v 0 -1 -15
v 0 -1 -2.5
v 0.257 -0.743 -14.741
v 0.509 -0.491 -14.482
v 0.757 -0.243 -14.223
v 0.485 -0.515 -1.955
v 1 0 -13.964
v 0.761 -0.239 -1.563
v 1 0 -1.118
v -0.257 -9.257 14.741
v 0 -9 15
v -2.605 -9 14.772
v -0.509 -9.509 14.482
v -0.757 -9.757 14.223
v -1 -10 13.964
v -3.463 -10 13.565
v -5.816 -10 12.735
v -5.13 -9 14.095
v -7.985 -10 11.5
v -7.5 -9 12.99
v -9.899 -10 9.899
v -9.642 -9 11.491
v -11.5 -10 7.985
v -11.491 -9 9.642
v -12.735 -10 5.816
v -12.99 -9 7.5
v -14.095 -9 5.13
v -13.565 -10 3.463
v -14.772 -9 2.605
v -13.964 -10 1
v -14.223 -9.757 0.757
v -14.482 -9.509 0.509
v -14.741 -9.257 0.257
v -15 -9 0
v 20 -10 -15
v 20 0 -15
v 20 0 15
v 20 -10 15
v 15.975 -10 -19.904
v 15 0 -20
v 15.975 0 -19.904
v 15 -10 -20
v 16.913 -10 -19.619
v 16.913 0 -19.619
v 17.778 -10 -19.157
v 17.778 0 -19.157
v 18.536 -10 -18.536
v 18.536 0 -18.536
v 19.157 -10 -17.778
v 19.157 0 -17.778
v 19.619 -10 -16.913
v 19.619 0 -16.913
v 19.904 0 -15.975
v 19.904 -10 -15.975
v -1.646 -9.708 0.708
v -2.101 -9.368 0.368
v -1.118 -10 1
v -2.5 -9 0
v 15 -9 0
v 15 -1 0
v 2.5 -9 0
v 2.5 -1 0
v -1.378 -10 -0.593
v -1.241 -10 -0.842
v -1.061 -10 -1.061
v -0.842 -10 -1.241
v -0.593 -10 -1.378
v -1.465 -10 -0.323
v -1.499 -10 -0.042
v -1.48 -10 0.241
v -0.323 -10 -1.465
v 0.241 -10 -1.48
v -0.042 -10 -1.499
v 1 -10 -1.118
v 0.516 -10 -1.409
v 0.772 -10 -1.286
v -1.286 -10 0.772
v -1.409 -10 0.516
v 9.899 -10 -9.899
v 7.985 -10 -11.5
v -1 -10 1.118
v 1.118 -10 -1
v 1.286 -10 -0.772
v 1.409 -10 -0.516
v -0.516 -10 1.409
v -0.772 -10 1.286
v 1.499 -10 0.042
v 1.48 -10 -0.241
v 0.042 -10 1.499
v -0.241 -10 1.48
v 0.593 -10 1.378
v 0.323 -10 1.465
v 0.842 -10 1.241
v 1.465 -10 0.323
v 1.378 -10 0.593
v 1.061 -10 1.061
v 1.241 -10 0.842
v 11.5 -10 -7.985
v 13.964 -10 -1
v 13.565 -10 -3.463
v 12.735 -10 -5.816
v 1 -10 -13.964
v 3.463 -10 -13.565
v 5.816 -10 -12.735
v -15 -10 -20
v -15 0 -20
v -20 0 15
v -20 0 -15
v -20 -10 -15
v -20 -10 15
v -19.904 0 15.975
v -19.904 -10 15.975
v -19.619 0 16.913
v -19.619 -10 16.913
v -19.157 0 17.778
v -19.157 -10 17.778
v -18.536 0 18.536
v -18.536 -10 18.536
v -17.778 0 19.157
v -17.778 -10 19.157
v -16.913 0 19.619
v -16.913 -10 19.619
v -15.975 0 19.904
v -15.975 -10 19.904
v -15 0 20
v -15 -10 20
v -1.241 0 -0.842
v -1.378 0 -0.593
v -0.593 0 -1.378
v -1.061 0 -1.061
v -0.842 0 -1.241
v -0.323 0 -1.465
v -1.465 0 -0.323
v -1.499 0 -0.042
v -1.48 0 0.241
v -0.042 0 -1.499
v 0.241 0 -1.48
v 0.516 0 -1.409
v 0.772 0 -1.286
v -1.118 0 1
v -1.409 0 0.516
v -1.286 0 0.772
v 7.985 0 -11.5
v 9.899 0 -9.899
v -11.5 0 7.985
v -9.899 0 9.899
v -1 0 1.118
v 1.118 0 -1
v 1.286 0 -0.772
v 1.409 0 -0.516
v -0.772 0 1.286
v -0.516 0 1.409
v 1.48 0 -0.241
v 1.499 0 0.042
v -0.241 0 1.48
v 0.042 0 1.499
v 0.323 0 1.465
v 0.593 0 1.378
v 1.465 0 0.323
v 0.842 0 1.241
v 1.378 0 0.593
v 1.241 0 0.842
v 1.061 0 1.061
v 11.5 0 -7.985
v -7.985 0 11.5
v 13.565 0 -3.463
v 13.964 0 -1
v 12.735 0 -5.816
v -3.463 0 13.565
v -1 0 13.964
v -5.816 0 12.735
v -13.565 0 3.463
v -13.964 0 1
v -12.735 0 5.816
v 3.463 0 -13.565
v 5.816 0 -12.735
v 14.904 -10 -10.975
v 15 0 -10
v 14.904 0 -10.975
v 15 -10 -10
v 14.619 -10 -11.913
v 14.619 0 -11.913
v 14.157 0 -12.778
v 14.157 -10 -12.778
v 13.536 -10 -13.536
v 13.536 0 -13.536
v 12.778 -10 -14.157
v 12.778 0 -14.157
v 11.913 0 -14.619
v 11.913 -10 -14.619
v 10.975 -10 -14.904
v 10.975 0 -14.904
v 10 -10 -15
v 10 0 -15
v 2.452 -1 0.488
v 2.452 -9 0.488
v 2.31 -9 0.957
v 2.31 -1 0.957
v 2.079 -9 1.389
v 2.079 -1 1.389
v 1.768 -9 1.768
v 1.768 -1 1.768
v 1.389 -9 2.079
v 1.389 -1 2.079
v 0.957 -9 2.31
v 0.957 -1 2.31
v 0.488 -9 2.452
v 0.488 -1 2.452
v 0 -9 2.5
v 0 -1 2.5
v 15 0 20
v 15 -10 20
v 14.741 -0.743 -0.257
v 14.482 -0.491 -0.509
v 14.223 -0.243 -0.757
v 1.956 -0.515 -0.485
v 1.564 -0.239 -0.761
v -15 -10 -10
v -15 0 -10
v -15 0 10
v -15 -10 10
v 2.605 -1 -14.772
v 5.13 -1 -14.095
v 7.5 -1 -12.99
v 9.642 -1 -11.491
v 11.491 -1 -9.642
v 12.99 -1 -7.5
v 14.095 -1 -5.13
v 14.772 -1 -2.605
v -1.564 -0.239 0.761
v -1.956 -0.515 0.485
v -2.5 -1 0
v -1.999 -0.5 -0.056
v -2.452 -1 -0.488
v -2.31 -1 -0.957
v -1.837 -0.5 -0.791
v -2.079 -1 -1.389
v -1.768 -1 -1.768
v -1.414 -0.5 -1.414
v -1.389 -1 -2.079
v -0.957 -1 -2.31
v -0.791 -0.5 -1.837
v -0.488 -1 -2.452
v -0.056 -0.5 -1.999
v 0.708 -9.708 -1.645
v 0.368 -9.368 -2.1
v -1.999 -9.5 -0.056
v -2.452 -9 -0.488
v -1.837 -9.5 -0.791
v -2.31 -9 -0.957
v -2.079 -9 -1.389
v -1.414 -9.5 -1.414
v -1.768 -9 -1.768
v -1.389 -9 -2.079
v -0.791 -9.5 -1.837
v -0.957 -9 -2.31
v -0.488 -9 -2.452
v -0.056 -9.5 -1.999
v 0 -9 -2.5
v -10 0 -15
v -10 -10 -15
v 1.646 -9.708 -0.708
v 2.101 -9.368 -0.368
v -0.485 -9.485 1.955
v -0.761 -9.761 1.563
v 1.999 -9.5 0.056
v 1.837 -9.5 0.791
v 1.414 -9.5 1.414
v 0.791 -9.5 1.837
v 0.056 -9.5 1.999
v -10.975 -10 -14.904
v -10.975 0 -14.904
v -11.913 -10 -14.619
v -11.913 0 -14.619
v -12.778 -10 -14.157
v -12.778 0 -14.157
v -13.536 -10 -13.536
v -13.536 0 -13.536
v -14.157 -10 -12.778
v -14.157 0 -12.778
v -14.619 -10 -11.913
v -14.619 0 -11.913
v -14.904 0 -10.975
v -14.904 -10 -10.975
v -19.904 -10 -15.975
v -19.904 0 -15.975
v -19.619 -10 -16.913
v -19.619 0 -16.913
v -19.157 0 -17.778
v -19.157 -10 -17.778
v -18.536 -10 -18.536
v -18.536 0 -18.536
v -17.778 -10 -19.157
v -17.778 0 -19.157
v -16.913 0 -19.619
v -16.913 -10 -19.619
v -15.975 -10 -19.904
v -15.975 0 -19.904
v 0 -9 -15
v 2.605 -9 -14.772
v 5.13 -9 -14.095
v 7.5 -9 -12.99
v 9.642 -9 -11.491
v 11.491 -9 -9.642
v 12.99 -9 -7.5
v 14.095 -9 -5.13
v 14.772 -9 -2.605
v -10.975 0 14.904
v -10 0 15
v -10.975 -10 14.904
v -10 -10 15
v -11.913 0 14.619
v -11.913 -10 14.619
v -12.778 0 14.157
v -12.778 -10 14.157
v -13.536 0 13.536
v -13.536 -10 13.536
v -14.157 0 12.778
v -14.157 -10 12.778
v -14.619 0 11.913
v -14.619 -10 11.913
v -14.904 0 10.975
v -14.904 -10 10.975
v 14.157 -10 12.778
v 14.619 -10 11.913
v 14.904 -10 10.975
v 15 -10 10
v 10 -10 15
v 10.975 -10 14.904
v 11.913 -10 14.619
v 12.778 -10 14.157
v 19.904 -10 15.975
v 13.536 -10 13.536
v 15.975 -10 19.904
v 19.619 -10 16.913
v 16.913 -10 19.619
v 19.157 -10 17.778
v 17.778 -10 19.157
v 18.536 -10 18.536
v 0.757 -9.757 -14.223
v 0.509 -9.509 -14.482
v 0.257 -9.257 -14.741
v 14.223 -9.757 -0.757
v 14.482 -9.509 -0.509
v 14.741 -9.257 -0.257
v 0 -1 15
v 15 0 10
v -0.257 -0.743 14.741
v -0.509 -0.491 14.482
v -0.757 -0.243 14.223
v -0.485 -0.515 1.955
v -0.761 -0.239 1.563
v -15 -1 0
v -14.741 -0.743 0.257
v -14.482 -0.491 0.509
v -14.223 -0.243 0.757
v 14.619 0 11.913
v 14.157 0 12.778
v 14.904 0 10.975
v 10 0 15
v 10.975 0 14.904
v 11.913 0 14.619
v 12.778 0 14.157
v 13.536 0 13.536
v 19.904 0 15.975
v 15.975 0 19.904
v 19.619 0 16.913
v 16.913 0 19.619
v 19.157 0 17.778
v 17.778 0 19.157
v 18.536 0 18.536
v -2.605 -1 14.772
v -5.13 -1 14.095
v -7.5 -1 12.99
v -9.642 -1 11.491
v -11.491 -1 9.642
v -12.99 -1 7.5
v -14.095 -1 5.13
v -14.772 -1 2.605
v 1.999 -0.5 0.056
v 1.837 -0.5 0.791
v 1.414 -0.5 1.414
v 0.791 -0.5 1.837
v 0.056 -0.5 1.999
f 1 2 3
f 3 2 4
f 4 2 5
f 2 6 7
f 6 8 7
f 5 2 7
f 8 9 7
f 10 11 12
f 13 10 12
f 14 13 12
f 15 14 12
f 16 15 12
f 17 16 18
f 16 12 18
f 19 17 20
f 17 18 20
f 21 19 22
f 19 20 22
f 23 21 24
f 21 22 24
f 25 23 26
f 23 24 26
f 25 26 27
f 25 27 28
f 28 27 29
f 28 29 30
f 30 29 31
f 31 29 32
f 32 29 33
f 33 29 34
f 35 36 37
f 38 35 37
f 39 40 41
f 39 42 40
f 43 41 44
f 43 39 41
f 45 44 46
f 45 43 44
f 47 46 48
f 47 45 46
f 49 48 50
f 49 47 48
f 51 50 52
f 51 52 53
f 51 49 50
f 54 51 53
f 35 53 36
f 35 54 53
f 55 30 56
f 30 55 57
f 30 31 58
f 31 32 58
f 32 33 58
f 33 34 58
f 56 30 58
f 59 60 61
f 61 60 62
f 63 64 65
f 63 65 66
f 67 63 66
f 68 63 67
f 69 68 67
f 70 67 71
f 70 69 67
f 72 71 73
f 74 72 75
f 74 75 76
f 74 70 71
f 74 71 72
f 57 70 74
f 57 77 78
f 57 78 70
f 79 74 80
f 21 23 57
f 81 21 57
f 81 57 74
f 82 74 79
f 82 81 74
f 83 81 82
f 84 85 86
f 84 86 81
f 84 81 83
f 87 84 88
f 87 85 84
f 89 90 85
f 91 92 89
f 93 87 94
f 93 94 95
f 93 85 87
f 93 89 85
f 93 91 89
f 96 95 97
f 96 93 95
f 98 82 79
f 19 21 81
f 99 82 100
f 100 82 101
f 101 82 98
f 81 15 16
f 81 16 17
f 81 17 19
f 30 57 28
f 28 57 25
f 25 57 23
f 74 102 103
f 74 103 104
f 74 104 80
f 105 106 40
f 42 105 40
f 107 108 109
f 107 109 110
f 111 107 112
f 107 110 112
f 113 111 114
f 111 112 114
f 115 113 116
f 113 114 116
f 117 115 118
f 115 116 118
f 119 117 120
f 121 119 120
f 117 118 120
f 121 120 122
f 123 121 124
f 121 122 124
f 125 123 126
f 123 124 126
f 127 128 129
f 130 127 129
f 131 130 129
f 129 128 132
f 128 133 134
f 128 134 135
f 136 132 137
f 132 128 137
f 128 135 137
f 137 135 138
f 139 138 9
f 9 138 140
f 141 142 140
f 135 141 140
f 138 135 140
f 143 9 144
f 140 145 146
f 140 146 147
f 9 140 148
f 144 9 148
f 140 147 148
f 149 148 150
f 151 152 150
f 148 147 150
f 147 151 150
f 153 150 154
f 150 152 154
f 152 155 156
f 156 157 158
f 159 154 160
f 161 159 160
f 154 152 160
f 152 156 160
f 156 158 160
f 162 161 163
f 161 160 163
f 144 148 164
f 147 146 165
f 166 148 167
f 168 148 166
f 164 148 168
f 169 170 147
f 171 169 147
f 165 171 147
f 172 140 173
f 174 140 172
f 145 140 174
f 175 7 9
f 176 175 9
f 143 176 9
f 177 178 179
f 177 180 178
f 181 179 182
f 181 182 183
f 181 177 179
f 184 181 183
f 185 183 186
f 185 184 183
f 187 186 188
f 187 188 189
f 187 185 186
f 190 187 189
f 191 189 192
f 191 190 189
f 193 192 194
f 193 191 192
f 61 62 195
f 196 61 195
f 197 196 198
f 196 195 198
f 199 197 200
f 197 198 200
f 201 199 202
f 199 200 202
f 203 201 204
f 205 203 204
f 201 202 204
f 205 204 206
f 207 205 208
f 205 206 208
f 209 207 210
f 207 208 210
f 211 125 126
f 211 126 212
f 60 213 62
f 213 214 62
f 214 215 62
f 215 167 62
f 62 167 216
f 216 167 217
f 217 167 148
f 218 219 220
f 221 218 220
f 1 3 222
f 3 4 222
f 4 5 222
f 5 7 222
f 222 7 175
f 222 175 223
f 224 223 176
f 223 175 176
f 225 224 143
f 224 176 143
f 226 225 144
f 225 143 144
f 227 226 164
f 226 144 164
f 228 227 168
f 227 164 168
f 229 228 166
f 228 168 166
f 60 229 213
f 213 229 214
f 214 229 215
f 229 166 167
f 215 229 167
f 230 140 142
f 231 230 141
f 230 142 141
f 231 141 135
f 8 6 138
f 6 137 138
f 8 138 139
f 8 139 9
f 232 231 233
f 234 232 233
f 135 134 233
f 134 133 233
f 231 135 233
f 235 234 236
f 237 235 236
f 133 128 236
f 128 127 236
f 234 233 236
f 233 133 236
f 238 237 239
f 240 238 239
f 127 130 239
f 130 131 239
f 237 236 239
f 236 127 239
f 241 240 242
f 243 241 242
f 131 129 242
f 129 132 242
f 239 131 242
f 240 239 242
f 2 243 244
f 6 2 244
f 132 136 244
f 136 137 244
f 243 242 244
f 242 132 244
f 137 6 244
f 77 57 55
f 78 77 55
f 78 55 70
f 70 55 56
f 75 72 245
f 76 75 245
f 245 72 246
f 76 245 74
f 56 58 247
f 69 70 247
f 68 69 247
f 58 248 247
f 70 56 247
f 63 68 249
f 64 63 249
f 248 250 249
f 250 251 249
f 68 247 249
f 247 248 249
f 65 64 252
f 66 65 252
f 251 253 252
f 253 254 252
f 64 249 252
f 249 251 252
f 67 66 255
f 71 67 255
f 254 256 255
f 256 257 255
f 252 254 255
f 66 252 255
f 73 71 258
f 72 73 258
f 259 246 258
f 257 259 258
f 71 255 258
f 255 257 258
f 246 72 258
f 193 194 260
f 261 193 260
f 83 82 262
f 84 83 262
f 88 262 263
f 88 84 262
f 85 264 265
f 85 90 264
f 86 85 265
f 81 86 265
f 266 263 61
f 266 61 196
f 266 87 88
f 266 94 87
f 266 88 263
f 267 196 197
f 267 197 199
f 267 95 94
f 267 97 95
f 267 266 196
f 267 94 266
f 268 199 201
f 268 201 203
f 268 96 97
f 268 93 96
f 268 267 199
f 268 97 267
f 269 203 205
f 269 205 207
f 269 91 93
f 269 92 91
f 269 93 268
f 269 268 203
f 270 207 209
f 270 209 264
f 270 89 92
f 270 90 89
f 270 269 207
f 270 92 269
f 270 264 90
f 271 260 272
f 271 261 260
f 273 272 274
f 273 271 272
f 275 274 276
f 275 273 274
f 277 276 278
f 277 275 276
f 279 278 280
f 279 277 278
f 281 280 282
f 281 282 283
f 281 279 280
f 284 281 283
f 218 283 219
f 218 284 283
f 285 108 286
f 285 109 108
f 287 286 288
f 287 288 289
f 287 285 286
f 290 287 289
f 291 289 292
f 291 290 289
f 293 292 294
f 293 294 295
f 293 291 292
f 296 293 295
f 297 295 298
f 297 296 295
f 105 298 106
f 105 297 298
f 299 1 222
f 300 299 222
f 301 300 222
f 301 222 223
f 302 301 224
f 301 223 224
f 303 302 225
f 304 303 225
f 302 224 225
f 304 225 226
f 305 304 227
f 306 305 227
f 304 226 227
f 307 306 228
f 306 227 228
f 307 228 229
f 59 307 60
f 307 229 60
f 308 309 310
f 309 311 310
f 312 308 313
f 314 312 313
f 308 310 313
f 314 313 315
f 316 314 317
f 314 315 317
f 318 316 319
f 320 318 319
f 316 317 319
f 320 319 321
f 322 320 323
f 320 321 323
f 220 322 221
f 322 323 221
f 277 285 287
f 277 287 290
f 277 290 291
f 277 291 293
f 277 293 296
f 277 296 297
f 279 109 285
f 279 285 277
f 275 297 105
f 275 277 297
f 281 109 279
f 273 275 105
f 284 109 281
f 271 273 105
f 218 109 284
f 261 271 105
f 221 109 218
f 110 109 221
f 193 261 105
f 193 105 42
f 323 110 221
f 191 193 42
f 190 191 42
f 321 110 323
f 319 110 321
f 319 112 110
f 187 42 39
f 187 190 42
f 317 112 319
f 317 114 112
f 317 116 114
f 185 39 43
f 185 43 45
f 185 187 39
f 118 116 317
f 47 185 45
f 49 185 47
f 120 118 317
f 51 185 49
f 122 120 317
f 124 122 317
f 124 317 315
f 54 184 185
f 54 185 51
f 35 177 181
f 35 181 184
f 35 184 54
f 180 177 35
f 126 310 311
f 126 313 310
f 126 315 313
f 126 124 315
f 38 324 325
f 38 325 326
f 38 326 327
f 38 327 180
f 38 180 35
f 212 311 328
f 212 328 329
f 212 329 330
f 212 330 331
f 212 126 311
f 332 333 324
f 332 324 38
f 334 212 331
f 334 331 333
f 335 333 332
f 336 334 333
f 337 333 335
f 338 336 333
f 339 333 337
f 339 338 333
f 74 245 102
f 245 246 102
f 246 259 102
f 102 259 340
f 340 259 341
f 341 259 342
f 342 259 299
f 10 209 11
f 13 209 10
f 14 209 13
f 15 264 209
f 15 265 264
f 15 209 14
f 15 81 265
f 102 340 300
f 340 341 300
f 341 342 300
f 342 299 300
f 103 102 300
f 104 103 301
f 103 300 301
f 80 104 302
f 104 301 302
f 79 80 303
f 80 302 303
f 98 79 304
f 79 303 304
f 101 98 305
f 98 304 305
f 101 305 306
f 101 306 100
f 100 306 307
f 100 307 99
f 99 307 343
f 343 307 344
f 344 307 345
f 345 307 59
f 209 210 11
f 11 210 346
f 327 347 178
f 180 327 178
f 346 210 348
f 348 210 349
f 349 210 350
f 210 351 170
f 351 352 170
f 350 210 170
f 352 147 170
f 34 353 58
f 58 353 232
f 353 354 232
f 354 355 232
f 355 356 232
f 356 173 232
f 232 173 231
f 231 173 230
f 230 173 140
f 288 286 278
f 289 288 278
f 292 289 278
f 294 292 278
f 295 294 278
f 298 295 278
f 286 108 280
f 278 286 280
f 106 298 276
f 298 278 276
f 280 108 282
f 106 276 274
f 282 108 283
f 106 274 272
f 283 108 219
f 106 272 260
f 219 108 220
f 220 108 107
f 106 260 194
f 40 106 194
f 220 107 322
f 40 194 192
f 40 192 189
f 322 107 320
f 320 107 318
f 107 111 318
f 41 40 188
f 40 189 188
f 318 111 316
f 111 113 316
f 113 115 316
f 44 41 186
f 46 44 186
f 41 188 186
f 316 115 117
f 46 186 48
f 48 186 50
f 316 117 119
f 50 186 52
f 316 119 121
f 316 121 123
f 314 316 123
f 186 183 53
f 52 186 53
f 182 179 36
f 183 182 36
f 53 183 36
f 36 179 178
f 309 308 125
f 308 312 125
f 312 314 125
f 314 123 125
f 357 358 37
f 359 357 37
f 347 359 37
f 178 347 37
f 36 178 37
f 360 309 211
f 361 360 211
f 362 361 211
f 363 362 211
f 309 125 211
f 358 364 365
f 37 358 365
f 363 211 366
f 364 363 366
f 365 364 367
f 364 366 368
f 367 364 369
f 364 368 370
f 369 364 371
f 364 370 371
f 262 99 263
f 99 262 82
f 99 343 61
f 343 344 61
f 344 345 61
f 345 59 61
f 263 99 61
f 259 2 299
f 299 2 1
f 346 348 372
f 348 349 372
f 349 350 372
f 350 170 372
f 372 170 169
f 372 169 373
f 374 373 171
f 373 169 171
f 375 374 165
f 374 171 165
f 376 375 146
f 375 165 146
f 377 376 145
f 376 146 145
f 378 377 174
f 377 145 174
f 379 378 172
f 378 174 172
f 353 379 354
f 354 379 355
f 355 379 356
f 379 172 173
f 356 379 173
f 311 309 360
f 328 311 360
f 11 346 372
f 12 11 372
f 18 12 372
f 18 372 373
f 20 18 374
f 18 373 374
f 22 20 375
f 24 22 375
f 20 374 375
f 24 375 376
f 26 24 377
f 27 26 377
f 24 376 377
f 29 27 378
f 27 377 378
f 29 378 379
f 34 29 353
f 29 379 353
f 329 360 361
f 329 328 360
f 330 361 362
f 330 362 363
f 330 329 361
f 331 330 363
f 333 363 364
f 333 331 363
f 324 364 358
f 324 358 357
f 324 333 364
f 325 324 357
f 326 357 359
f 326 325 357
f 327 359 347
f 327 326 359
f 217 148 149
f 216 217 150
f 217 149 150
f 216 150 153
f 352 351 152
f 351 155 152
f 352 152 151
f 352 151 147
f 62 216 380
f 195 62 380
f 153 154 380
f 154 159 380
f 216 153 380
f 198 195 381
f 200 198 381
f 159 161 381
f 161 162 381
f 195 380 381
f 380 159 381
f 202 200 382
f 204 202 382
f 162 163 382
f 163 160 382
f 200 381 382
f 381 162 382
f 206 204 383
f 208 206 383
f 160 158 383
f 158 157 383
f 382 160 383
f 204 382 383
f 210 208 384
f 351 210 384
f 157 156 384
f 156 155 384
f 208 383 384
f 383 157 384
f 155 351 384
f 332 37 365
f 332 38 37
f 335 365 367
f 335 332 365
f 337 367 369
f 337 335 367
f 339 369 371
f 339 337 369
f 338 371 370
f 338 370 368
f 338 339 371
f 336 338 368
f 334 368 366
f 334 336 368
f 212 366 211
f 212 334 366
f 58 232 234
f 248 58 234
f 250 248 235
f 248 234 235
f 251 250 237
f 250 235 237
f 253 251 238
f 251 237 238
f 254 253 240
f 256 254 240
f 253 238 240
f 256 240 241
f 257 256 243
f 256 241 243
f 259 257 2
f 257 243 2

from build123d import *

# Parameters (mm, degrees)
F0_W     = 40
F0_H     = 40
F1_DEPTH = 10
F2_R     = 5
F3_SIZE  = 1
F4_SIZE  = 1


with BuildPart() as f1:
    # F0 (on Front) → F1 (new body)
    with BuildSketch(Plane.XZ):
        Rectangle(F0_W, F0_H)
        Polygon((0, 15), (15, 15), (15, 0), (15, -15), (0, -15), (-15, -15), (-15, 0), (-15, 15), align=None, mode=Mode.SUBTRACT)
    extrude(amount=F1_DEPTH)

    # F2
    f2_edges = [f1.edges().sort_by_distance(p)[0] for p in [
        (-20, -5, 20),
        (20, -5, 20),
        (20, -5, -20),
        (-20, -5, -20),
        (15, -5, -15),
        (15, -5, 15),
        (-15, -5, -15),
        (-15, -5, 15),
    ]]
    fillet(f2_edges, radius=F2_R)


with BuildPart() as f1b:
    # F0 (on Front) → F1, piece 2 (new body)
    with BuildSketch(Plane.XZ):
        with BuildLine():
            Line((0, 2.5), (0, 15))
            ThreePointArc((0, 15), (-10.6066017178, 10.6066017178), (-15, 0))
            Line((-15, 0), (-2.5, 0))
            ThreePointArc((-2.5, 0), (-1.767766953, -1.767766953), (0, -2.5))
            Line((0, -2.5), (0, -15))
            ThreePointArc((0, -15), (10.6066017178, -10.6066017178), (15, 0))
            Line((15, 0), (2.5, 0))
            ThreePointArc((2.5, 0), (1.767766953, 1.767766953), (0, 2.5))
        make_face()
    extrude(amount=F1_DEPTH)

    # F3
    f3_edges = [f1b.edges().sort_by_distance(p)[0] for p in [
        (8.75, 0, 0),
        (1.767767, 0, 1.767767),
        (0, 0, 8.75),
        (-10.606602, 0, 10.606602),
        (-8.75, 0, 0),
        (-1.767767, 0, -1.767767),
        (0, 0, -8.75),
        (10.606602, 0, -10.606602),
    ]]
    chamfer(f3_edges, length=F3_SIZE)

    # F4
    f4_edges = [f1b.edges().sort_by_distance(p)[0] for p in [
        (8.75, -10, 0),
        (1.767767, -10, 1.767767),
        (0, -10, 8.75),
        (-10.606602, -10, 10.606602),
        (-8.75, -10, 0),
        (-1.767767, -10, -1.767767),
        (0, -10, -8.75),
        (10.606602, -10, -10.606602),
    ]]
    chamfer(f4_edges, length=F4_SIZE)


solid = Compound([f1.part, f1b.part])
